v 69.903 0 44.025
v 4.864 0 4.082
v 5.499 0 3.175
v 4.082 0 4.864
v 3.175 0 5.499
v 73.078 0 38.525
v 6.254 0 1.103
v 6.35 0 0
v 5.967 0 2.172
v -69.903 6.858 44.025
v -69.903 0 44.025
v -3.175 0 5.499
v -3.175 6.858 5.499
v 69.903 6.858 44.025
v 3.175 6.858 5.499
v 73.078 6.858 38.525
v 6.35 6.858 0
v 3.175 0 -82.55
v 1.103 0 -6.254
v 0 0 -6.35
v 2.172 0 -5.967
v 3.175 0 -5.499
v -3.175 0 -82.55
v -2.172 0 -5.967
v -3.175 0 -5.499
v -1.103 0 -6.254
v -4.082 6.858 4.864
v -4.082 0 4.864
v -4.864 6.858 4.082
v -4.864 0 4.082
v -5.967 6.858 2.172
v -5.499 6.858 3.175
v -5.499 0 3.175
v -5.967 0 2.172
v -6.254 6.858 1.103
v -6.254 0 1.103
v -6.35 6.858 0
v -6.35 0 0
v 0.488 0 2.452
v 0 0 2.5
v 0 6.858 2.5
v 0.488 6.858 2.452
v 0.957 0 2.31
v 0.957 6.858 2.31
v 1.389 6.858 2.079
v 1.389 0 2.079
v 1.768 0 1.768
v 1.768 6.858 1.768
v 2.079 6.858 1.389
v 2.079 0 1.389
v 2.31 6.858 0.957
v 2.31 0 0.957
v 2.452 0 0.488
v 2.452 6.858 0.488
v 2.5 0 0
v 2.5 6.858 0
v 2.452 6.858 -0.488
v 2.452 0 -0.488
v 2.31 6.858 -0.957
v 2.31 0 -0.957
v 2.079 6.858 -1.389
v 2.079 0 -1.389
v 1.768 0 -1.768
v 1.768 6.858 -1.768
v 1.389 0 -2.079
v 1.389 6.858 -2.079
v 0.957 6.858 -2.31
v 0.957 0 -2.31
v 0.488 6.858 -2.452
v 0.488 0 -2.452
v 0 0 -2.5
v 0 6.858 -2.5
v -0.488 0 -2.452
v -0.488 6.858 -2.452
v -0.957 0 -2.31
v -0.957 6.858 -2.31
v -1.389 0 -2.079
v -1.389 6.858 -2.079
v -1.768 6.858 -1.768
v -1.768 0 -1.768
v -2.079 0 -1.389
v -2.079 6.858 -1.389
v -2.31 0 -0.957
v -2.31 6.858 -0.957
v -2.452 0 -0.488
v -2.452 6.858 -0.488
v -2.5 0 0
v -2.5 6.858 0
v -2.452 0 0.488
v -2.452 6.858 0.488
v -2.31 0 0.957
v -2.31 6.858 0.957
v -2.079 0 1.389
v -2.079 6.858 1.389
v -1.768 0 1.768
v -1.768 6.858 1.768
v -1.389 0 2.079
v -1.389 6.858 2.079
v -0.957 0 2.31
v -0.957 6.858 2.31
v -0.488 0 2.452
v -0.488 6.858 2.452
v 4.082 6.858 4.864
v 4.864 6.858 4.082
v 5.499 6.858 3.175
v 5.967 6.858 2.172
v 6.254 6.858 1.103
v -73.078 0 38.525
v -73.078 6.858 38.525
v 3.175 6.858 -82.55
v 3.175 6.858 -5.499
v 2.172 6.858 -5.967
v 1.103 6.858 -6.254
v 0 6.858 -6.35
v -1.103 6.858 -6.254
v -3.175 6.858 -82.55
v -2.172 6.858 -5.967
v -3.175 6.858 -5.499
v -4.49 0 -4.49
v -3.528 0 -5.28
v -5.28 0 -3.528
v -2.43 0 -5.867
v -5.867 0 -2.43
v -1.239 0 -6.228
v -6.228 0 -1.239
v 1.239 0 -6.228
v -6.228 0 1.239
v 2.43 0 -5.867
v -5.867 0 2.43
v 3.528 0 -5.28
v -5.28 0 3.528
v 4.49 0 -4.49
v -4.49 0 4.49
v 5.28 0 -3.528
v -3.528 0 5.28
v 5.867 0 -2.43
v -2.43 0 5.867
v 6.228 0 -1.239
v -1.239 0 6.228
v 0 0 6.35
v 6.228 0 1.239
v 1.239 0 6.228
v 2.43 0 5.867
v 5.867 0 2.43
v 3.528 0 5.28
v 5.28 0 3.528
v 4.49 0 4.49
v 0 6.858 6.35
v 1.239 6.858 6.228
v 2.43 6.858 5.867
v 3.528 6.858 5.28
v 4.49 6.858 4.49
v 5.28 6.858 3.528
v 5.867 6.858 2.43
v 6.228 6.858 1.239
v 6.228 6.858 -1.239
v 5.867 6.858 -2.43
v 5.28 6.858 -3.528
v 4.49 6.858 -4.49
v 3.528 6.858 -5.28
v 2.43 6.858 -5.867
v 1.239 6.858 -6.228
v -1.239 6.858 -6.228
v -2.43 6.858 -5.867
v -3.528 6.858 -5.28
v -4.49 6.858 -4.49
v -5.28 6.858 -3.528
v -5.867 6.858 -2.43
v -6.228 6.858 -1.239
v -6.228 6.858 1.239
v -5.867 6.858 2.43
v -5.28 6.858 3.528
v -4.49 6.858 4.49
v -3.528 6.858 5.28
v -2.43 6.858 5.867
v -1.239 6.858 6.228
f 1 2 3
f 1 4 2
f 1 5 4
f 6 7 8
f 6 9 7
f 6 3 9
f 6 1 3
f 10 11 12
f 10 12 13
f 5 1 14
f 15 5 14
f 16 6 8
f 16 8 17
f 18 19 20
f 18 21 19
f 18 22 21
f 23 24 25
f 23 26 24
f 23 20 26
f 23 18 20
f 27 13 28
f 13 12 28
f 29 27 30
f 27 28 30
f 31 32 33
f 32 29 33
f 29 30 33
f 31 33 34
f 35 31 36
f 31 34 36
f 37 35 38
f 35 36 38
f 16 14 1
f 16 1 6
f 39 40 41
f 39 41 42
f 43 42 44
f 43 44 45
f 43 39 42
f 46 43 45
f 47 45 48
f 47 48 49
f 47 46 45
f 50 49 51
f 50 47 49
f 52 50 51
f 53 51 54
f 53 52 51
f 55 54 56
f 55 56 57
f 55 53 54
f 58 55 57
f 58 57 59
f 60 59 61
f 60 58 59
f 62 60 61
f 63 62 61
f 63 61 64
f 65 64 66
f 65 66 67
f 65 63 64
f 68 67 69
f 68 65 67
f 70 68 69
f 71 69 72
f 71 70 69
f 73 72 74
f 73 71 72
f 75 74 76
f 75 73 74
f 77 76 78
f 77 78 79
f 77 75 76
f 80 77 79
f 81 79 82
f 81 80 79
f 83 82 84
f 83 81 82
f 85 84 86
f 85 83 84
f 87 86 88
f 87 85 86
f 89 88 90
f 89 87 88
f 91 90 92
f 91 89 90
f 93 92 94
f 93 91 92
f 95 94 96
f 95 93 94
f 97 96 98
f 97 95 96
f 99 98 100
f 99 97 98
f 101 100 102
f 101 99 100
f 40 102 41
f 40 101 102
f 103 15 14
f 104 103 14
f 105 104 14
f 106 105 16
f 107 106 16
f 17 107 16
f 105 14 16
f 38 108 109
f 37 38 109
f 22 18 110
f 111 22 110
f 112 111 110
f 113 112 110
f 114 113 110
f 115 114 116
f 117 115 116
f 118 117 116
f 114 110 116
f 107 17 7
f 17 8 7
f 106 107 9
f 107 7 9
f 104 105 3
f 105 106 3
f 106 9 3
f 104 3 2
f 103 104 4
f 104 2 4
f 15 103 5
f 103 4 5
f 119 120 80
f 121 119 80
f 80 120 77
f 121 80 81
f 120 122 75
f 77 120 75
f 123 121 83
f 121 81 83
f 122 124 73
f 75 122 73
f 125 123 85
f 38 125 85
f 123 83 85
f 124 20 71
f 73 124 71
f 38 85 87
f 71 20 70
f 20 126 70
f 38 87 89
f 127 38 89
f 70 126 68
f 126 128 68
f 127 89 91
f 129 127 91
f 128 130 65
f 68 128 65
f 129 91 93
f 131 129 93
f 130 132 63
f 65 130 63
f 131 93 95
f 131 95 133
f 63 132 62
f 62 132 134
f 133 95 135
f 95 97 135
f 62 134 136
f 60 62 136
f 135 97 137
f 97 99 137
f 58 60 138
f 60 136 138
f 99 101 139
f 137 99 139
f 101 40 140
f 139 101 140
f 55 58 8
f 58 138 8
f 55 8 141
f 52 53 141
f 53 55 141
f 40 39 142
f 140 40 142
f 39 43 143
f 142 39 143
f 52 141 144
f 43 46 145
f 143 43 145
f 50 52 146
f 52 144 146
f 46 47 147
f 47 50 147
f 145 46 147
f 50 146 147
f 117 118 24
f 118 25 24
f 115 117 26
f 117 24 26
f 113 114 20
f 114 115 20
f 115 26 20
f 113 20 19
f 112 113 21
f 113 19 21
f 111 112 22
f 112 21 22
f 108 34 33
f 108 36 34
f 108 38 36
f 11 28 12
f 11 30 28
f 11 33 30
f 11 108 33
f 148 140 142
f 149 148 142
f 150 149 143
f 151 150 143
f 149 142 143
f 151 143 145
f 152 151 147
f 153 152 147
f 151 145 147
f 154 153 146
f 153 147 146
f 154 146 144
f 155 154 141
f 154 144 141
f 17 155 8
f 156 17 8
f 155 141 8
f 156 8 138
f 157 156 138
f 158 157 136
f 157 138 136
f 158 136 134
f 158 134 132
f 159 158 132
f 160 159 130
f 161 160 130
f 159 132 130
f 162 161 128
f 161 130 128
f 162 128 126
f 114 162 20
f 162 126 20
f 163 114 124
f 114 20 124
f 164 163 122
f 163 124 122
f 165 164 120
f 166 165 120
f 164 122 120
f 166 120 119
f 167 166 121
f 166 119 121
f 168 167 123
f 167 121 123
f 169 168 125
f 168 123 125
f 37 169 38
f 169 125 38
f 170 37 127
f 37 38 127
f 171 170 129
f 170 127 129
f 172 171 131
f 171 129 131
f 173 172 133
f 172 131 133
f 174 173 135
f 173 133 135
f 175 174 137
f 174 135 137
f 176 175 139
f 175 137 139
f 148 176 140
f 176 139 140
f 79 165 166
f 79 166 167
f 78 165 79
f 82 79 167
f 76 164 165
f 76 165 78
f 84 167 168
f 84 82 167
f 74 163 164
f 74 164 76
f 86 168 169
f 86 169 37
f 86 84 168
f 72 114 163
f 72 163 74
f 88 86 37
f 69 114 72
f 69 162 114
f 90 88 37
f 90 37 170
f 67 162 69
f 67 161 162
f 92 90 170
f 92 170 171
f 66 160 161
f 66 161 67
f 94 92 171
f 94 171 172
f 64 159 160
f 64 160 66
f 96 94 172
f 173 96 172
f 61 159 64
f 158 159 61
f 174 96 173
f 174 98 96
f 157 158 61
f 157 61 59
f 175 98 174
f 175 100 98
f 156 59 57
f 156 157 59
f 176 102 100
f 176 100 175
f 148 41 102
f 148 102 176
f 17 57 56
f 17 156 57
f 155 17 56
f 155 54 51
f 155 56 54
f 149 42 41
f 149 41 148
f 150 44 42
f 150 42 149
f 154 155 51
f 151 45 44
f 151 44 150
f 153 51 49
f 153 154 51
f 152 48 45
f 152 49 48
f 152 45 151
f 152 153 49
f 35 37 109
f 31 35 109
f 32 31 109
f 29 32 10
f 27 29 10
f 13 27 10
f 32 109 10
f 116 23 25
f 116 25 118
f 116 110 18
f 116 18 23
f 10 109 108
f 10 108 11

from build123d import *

# Parameters (mm, degrees)
SKETCH1_R                            = 6.35
SKETCH1_R_2                          = 2.499995
BOSS_EXTRUDE1_DEPTH                  = 6.858
SKETCH3_W                            = 6.35
SKETCH3_H                            = 6.858
BOSS_EXTRUDE2_DEPTH                  = 76.2
BOSS_EXTRUDE2_DIRECTION_2_REACH      = 17.768
BOSS_EXTRUDE2_DIRECTION_2_END_RADIUS = 6.35
CIRPATTERN5_COUNT                    = 3


with BuildPart() as part:
    # Sketch1 → Boss-Extrude1 (new body)
    with BuildSketch(Plane(origin=(0, 0, 0), x_dir=(1, 0, 0), z_dir=(0, 1, 0))):
        with Locations(Location((0, 0, 0), (0, 0, 270))):
            Circle(SKETCH1_R)
        with Locations(Location((0, 0, 0), (0, 0, 270))):
            Circle(SKETCH1_R_2, mode=Mode.SUBTRACT)
    extrude(amount=BOSS_EXTRUDE1_DEPTH)


with BuildPart() as body_2:
    # Sketch3 → Boss-Extrude2 (new body)
    with BuildSketch(Plane(origin=(0, 0, -6.35), x_dir=(-1, 0, 0), z_dir=(0, 0, -1))):
        with Locations((0, 3.429)):
            Rectangle(SKETCH3_W, SKETCH3_H)
    extrude(amount=BOSS_EXTRUDE2_DEPTH)

    # Boss-Extrude2 direction 2: up to this cylinder (the profile starts outside it)
    boss_extrude2_direction_2_end = Plane(origin=(0, 3.429, 0), z_dir=(0, -1, 0)) * Cylinder(BOSS_EXTRUDE2_DIRECTION_2_END_RADIUS, 49.236, mode=Mode.PRIVATE)
    # Sketch3 → Boss-Extrude2 direction 2 (add, up to the surface)
    with BuildSketch(Plane(origin=(0, 0, -6.35), x_dir=(-1, 0, 0), z_dir=(0, 0, -1)), mode=Mode.PRIVATE) as boss_extrude2_direction_2_sk1:
        with Locations((0, 3.429)):
            Rectangle(SKETCH3_W, SKETCH3_H)
    boss_extrude2_direction_2_tool1 = extrude(boss_extrude2_direction_2_sk1.sketch, amount=-BOSS_EXTRUDE2_DIRECTION_2_REACH, mode=Mode.PRIVATE) - boss_extrude2_direction_2_end
    add(boss_extrude2_direction_2_tool1.solids().sort_by_distance((0, 3.429, -6.35))[0])
    add(boss_extrude2_direction_2_tool1.solids().sort_by_distance((0, 3.429, -6.35))[1])


with BuildPart() as cirpattern5_1:
    # CirPattern5: pattern copy
    add(body_2.part.rotate(Axis((0, 0, 0), (0, 1, 0)), 1 * 360 / CIRPATTERN5_COUNT))


with BuildPart() as cirpattern5_2:
    # CirPattern5: pattern copy
    add(body_2.part.rotate(Axis((0, 0, 0), (0, 1, 0)), 2 * 360 / CIRPATTERN5_COUNT))


solid = Compound([part.part, body_2.part, cirpattern5_1.part, cirpattern5_2.part])
